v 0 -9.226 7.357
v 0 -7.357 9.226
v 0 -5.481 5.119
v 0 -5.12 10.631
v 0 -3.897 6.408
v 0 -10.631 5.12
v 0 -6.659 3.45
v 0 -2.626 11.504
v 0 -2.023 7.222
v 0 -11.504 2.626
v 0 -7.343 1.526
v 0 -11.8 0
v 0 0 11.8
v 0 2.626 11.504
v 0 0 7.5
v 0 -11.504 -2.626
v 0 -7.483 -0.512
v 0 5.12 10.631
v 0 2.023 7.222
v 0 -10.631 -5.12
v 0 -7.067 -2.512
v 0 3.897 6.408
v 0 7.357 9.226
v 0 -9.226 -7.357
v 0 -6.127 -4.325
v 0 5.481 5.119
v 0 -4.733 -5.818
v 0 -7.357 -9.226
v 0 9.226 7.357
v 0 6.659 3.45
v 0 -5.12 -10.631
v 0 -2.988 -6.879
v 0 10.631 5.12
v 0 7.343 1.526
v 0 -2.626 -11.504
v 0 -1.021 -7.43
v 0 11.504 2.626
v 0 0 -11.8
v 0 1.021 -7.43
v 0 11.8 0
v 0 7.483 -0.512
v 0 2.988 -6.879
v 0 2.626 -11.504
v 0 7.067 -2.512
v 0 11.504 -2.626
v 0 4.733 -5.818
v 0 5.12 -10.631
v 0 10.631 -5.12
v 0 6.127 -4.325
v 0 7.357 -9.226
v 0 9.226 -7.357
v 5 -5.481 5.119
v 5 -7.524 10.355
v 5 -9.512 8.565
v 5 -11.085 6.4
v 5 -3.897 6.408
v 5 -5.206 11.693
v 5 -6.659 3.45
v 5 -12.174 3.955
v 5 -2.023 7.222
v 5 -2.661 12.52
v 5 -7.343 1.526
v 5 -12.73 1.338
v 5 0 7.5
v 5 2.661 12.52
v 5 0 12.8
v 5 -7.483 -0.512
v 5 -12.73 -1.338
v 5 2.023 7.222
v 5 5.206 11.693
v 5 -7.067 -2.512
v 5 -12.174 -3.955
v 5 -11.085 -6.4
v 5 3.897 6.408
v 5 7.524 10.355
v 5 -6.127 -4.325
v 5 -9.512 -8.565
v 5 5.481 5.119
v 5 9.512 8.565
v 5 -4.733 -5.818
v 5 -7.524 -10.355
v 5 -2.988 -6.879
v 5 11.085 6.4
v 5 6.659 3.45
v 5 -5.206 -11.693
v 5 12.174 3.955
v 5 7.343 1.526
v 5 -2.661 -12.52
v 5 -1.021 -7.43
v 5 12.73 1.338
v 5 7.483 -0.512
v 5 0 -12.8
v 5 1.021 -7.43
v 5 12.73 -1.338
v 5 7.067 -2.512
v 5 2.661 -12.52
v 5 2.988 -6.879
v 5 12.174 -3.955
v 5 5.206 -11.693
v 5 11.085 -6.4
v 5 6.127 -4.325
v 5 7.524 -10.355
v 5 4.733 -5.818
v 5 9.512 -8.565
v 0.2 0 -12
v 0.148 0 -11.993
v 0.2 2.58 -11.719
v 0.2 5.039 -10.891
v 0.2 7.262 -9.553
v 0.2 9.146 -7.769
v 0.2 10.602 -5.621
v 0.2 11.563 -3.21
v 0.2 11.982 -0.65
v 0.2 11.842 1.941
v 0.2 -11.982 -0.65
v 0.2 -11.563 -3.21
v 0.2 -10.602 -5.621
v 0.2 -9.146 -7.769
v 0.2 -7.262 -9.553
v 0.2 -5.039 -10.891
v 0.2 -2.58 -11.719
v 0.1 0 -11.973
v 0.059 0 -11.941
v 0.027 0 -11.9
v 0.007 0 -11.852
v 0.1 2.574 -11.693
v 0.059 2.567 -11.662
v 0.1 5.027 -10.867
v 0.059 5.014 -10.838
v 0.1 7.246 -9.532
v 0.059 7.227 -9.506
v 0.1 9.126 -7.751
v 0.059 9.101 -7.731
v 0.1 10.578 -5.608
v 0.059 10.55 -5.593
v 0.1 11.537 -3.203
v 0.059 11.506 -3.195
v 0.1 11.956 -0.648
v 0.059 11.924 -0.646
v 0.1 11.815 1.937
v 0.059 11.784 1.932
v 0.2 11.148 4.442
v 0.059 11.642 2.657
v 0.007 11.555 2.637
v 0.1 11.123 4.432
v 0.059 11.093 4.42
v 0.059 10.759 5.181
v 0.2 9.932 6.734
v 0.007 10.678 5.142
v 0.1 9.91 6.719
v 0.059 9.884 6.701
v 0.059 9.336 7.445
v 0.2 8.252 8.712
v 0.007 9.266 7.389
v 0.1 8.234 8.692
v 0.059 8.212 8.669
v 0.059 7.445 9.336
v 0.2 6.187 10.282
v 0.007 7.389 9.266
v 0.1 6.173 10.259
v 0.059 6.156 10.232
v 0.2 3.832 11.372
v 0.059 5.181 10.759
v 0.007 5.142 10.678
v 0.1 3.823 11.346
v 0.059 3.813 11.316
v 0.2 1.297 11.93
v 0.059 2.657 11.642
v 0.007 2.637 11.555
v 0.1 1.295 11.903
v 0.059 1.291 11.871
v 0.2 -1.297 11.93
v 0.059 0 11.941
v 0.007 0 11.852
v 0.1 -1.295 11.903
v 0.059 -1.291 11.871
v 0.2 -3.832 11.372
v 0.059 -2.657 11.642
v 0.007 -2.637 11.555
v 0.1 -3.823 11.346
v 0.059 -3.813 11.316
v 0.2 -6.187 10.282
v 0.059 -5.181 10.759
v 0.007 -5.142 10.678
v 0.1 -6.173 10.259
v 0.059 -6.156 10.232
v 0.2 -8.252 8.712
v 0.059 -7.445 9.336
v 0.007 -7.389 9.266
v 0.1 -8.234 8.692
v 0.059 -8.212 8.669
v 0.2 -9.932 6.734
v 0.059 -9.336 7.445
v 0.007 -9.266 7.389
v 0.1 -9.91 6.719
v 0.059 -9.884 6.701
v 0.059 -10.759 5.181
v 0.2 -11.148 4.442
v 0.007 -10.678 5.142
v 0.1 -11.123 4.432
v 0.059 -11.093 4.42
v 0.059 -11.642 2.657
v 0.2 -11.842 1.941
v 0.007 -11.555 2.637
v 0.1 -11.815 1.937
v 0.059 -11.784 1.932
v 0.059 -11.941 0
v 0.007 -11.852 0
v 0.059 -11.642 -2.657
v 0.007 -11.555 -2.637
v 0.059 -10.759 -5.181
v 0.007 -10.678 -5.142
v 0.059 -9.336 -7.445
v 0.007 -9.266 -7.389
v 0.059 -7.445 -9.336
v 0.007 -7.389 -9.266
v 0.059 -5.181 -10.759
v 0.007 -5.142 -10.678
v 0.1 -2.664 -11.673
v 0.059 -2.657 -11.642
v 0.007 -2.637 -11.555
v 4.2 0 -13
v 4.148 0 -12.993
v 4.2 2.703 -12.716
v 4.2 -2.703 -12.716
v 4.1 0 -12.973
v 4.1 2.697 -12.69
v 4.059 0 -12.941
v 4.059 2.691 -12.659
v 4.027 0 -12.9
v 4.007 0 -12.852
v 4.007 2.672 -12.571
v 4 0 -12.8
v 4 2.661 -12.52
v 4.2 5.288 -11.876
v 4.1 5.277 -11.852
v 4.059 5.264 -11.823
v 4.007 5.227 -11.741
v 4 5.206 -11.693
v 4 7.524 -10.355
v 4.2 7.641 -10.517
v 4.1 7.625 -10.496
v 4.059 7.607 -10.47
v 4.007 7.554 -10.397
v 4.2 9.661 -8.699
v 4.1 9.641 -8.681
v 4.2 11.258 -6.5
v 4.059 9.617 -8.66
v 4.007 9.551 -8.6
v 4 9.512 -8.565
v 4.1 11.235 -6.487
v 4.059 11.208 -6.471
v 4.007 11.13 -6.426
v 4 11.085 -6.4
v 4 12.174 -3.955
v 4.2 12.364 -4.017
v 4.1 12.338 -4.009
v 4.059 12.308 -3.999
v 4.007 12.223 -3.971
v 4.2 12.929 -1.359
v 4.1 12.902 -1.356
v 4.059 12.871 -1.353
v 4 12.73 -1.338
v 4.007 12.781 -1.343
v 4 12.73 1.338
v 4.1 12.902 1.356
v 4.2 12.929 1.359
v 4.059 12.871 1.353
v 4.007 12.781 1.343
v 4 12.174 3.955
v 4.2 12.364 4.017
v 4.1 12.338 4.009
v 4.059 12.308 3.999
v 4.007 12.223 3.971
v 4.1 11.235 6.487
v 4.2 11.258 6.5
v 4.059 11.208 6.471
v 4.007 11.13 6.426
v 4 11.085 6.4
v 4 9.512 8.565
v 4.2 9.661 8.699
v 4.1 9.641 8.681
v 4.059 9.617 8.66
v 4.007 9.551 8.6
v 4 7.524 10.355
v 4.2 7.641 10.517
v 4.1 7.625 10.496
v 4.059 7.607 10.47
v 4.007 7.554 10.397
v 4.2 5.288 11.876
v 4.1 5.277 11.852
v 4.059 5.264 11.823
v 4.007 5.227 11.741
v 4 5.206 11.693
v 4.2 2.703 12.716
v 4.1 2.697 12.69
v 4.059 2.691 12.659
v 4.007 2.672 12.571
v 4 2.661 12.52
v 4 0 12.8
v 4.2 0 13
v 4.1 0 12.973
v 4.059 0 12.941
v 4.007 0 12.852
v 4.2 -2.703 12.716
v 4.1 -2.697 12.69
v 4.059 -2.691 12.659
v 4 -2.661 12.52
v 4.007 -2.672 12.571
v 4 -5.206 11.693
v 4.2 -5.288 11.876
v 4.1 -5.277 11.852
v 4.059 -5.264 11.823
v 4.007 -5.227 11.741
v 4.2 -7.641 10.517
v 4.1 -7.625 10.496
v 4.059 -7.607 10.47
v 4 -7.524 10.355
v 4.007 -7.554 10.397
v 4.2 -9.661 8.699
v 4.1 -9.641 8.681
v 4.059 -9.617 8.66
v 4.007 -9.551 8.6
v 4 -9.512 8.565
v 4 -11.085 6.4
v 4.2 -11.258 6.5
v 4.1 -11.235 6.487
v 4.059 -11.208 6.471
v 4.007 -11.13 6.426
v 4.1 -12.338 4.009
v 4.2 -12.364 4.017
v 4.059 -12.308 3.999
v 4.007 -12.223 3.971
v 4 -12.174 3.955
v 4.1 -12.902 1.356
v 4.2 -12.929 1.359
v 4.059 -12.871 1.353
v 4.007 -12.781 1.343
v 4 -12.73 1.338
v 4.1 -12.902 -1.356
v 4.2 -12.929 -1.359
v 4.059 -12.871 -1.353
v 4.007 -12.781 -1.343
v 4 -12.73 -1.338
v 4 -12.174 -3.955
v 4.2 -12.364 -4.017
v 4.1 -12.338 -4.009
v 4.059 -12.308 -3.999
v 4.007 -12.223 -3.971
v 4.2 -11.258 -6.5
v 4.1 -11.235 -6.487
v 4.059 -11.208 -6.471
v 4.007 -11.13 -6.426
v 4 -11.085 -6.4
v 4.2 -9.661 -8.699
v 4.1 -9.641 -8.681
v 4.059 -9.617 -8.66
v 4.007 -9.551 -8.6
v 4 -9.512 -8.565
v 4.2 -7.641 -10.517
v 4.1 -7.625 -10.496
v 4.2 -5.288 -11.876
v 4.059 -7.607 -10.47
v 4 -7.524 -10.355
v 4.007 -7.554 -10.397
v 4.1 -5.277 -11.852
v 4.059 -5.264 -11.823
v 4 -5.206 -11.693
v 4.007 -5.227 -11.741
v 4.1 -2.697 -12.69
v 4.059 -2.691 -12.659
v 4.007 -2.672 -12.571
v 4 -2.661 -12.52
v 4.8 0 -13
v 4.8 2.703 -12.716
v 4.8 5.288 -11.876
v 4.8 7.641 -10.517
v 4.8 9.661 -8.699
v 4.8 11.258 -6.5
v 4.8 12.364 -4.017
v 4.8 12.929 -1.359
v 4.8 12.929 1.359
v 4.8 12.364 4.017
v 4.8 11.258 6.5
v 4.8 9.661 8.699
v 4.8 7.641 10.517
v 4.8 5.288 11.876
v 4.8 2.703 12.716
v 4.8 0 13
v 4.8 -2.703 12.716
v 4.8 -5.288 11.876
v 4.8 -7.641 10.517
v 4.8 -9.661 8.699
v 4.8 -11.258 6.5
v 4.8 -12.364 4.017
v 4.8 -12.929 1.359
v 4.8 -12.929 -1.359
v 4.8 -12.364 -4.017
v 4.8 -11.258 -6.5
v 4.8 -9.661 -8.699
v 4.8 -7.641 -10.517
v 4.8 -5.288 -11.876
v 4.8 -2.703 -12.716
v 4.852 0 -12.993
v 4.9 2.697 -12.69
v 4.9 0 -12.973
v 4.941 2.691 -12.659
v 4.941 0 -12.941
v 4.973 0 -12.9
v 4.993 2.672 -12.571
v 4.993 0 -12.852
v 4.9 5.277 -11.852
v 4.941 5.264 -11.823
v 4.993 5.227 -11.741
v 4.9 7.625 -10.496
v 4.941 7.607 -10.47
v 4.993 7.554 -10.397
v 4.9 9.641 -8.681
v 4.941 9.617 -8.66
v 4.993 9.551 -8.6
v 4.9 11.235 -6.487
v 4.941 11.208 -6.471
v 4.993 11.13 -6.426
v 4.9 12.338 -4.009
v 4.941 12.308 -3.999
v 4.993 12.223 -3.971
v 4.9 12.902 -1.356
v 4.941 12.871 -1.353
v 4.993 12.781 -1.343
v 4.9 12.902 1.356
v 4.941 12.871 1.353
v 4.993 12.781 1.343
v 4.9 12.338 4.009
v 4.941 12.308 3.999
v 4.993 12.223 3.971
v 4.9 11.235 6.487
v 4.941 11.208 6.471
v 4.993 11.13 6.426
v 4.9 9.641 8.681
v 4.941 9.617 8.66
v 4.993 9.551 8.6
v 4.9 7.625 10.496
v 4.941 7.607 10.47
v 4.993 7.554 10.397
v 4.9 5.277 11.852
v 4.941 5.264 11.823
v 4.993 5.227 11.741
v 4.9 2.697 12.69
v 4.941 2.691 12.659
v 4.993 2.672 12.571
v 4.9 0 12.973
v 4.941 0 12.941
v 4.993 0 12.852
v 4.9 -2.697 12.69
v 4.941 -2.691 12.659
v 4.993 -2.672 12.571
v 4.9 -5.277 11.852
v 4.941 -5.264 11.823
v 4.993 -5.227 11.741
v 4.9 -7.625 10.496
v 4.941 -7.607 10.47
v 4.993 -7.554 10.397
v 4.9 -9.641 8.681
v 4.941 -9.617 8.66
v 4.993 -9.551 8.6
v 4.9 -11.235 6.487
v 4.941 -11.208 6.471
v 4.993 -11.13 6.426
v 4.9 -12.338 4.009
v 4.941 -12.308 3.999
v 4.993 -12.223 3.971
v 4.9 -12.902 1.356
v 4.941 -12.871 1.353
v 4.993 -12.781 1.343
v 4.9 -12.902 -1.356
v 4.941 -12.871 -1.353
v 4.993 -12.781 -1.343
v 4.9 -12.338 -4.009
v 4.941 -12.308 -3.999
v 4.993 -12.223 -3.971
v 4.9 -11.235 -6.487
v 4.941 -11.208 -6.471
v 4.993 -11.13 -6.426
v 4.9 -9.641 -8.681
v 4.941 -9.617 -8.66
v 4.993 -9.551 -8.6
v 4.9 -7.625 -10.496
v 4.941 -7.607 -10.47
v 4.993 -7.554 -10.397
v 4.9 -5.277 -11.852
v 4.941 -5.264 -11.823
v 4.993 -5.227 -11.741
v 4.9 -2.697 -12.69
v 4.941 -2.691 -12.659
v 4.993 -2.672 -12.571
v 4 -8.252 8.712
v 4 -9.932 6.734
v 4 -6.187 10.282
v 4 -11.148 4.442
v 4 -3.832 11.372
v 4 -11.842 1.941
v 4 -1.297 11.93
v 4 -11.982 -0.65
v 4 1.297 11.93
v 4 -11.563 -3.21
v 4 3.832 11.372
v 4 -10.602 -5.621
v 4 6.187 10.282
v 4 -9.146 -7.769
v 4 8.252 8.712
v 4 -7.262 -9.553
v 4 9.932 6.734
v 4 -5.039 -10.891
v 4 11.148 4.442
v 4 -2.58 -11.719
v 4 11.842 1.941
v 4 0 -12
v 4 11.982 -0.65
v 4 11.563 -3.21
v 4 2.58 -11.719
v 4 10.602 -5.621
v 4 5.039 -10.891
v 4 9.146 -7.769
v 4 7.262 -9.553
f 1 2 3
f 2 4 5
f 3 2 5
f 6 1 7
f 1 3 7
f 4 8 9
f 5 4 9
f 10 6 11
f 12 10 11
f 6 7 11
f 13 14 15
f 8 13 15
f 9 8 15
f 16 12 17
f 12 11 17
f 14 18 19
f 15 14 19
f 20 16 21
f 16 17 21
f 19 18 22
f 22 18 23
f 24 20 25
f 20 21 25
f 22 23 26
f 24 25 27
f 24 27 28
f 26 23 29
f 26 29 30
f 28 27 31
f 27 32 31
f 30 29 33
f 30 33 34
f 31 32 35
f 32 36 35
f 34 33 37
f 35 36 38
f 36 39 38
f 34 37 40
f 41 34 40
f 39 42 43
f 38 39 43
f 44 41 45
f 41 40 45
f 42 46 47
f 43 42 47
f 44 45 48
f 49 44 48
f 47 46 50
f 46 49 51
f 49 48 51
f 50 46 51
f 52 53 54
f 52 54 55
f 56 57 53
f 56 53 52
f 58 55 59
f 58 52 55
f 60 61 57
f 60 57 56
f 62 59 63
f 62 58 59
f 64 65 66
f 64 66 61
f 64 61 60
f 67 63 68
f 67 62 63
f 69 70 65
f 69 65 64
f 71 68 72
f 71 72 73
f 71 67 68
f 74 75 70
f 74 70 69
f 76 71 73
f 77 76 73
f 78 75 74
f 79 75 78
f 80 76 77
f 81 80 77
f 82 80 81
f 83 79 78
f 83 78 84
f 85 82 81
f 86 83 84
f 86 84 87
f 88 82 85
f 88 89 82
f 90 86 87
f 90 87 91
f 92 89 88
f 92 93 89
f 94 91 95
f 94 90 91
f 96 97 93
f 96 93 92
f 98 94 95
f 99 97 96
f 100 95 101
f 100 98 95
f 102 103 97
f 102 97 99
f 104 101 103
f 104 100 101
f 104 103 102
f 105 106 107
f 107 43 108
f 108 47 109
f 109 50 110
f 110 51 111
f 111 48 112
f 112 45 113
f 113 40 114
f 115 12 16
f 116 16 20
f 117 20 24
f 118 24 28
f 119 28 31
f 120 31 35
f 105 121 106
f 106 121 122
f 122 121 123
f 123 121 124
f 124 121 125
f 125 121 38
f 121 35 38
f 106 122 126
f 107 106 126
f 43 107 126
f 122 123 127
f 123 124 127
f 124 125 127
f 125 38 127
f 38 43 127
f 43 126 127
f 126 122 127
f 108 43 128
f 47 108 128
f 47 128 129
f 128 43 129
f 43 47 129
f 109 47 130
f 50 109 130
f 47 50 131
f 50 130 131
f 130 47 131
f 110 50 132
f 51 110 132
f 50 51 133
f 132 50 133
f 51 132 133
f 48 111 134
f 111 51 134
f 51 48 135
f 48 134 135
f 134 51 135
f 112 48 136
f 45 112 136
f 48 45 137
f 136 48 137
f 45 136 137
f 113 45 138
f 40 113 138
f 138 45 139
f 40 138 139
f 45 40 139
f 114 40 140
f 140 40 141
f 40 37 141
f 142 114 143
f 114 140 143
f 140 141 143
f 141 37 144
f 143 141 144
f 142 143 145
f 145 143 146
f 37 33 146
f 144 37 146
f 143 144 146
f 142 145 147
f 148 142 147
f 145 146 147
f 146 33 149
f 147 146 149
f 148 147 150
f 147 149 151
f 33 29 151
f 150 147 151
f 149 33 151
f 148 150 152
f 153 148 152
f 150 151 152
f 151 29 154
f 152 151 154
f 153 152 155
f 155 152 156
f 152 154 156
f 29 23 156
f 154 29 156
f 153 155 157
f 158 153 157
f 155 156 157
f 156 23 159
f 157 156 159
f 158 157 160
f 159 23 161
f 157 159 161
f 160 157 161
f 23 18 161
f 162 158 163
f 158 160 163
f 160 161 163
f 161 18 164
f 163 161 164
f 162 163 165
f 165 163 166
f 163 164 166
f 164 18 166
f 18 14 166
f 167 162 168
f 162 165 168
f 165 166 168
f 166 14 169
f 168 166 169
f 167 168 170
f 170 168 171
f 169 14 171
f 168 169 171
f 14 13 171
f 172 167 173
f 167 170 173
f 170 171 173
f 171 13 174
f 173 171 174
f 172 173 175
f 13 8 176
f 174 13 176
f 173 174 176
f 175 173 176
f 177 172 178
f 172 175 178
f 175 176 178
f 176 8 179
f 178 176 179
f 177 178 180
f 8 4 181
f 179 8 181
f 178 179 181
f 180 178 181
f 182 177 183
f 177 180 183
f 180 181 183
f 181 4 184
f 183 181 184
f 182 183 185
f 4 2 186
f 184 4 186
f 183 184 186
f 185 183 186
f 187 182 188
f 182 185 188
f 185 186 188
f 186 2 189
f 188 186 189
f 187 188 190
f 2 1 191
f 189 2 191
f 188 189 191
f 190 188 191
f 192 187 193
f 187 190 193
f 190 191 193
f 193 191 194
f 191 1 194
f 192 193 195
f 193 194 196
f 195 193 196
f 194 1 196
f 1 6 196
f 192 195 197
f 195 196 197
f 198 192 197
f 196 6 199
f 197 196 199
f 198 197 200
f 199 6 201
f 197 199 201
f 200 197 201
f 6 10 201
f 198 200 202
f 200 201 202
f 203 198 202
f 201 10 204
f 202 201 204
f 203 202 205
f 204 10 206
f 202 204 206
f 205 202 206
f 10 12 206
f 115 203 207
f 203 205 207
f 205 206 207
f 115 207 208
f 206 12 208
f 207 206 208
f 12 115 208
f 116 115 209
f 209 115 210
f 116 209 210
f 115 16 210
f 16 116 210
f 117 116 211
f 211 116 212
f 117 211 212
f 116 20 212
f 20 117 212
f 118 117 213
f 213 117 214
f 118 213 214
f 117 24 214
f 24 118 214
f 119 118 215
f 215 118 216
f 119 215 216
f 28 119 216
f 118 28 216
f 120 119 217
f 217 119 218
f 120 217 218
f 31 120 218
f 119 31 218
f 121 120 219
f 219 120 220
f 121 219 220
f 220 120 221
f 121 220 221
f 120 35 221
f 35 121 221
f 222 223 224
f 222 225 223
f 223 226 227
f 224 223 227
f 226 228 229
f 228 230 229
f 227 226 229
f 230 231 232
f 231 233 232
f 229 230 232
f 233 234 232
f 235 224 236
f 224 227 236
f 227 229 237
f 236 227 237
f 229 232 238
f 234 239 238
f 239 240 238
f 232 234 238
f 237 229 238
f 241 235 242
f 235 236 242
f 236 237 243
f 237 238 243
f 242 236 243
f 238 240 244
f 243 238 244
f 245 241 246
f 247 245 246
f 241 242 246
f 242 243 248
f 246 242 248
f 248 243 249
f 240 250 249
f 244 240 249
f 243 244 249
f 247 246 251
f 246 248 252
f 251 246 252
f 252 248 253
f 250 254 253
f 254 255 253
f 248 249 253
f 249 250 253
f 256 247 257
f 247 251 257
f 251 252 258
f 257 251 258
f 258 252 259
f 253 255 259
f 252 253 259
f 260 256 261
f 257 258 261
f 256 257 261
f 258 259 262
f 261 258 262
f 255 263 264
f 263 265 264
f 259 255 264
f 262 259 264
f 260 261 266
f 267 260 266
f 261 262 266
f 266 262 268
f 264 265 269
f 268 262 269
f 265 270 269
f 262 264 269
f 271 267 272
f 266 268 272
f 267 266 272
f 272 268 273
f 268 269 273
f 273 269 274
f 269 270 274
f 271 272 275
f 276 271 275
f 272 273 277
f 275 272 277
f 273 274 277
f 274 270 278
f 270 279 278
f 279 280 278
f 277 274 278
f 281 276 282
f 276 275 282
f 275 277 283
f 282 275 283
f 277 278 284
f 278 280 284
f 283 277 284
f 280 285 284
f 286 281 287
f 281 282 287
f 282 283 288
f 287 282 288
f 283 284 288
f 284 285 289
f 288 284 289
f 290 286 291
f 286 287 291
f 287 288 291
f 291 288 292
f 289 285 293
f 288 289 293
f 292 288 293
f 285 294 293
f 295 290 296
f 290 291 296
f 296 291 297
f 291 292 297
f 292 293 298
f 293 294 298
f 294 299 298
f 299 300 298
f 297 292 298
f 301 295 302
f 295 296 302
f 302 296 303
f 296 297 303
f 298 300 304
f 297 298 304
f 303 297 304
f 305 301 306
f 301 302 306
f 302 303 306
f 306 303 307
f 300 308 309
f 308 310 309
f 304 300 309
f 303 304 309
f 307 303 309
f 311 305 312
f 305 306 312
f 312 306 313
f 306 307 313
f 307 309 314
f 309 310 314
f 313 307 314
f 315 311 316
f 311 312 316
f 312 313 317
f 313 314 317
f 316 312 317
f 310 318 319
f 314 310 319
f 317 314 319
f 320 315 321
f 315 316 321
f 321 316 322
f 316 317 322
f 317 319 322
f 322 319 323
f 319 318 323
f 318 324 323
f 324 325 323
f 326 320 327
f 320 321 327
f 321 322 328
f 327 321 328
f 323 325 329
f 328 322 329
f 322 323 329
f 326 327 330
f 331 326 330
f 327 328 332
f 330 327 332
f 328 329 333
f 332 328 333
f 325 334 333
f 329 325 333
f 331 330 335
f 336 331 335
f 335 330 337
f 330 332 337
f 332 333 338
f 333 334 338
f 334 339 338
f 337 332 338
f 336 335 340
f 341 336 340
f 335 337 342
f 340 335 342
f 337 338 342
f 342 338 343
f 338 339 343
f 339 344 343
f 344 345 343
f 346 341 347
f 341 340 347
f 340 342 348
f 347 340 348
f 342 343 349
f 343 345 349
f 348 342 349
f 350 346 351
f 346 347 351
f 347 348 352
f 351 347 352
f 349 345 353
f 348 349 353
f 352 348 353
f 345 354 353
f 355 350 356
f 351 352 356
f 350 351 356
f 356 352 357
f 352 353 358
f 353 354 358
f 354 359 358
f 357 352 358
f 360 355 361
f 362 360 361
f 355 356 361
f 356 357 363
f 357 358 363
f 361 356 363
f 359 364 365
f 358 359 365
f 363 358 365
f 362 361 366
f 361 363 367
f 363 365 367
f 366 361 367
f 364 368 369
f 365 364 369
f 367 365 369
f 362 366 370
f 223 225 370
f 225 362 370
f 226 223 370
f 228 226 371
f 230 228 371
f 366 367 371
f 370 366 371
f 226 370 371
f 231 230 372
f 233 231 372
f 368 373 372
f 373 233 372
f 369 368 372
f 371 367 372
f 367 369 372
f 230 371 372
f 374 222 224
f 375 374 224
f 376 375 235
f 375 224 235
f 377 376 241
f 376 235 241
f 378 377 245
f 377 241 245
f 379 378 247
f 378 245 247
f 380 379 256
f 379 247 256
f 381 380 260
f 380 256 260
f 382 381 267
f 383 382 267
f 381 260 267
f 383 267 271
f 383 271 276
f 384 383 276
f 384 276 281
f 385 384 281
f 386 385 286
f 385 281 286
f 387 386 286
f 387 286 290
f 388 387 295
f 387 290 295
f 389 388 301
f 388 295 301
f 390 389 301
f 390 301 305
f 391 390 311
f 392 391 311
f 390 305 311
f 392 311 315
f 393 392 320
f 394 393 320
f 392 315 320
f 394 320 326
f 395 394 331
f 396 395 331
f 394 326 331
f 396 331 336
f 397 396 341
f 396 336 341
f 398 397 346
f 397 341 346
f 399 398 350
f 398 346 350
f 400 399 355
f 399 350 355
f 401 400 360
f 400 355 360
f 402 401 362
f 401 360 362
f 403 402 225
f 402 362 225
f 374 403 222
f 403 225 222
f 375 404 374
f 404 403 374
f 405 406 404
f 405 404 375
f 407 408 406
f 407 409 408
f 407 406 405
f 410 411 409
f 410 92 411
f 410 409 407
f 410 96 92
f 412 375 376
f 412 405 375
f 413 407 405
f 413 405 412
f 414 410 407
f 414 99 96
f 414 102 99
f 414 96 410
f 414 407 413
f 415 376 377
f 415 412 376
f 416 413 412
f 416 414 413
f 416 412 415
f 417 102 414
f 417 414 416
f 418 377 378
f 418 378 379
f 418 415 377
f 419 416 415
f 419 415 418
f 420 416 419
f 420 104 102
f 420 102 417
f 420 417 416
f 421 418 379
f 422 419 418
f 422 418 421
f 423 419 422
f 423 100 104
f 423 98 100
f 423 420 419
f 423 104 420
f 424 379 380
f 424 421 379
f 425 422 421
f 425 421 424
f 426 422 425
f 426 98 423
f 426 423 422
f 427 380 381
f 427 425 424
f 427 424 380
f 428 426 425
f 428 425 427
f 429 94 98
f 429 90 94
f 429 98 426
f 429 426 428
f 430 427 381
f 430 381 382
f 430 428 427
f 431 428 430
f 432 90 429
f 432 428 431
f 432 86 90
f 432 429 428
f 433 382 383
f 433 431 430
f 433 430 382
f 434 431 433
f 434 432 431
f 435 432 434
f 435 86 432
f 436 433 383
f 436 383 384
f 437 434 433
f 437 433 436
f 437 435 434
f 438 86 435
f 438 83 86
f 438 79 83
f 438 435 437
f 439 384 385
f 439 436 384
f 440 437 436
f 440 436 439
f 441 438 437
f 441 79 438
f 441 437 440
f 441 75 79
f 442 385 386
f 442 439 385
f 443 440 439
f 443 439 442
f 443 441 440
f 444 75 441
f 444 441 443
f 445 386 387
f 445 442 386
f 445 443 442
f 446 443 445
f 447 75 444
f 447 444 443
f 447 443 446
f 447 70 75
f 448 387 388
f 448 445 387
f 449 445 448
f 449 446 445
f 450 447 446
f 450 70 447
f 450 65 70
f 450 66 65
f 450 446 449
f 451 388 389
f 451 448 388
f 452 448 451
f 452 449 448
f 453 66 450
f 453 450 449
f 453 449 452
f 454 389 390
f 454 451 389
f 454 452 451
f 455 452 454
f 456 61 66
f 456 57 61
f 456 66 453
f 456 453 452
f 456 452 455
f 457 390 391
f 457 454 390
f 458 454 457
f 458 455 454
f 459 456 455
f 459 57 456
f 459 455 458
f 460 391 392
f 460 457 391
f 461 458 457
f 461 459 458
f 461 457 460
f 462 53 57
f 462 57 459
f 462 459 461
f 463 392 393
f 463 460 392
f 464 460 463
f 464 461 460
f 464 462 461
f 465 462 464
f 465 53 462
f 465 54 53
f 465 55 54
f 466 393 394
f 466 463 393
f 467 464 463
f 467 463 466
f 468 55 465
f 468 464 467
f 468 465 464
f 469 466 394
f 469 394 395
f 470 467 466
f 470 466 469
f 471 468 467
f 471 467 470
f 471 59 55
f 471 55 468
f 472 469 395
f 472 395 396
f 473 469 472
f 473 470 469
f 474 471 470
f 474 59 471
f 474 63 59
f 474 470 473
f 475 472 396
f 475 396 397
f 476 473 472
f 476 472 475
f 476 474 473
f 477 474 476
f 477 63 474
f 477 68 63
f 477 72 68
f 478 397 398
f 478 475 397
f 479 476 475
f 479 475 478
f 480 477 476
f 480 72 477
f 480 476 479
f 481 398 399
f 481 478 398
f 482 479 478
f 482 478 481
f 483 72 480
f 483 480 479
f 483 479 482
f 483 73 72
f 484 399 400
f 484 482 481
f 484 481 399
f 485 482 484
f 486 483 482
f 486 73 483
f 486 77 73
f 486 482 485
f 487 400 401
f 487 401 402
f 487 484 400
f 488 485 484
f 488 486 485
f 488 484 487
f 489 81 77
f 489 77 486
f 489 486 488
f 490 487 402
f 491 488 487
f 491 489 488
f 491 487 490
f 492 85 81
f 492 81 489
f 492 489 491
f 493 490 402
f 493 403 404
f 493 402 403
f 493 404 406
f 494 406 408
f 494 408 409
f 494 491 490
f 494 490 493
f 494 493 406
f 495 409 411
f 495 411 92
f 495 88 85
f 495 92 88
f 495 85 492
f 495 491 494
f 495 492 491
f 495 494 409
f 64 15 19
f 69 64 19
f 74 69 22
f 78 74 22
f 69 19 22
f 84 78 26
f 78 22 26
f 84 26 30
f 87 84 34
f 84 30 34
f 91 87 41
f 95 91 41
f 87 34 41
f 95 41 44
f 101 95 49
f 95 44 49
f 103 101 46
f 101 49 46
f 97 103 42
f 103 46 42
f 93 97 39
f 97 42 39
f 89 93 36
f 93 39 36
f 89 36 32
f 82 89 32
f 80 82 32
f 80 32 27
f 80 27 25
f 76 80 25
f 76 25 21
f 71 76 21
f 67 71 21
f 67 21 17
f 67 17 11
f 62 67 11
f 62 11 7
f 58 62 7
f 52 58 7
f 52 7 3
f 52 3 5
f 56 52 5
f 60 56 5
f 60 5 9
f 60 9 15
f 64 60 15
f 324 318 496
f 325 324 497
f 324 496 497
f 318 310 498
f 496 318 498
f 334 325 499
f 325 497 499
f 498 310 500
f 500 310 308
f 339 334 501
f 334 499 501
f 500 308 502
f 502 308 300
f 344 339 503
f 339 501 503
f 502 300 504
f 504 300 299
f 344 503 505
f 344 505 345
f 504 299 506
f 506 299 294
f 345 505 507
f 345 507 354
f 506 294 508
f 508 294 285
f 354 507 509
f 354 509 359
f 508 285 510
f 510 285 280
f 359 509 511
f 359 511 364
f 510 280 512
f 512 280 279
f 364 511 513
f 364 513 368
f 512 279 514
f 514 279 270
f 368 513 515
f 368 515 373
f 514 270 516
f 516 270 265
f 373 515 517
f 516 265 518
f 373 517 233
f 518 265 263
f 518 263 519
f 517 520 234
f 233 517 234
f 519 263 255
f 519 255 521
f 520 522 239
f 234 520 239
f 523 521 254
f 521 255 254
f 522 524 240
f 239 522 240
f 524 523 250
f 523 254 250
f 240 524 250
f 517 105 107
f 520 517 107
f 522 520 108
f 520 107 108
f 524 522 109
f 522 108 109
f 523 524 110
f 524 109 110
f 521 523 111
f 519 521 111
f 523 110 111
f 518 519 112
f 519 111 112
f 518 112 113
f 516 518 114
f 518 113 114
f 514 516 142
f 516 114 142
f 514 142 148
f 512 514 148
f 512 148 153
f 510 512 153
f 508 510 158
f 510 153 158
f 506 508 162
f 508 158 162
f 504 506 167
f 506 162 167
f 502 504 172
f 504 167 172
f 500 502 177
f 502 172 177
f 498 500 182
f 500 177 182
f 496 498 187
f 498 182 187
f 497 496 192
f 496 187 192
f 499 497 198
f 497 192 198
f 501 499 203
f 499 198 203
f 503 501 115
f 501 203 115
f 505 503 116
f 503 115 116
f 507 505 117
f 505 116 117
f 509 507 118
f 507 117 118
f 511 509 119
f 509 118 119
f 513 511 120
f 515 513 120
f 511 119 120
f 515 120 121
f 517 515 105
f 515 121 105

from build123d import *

# Parameters (mm, degrees)
SKETCH_1_R          = 12
EXTRUDE_1_DEPTH     = 4
SKETCH_2_R          = 13
EXTRUDE_2_DEPTH     = 1
SKETCH_3_R          = 7.5
CUT_EXTRUDE_1_DEPTH = 6
FILLET_1_R          = 0.2


with BuildPart() as part:
    # 草图1 → 凸台-拉伸1 (new body)
    with BuildSketch(Plane(origin=(0, 0, 0), x_dir=(0, 0, -1), z_dir=(1, 0, 0))):
        Circle(SKETCH_1_R)
    extrude(amount=EXTRUDE_1_DEPTH)

    # 草图2 → 凸台-拉伸2 (add)
    with BuildSketch(Plane(origin=(4, 0, 0), x_dir=(0, 0, -1), z_dir=(1, 0, 0))):
        Circle(SKETCH_2_R)
    extrude(amount=EXTRUDE_2_DEPTH)

    # 草图3 → 切除-拉伸1 (cut, through all)
    with BuildSketch(Plane.ZY):
        Circle(SKETCH_3_R)
    extrude(amount=-CUT_EXTRUDE_1_DEPTH, mode=Mode.SUBTRACT)

    # 圆角1
    fillet_1_edges = [part.edges().sort_by_distance(p)[0] for p in [
        (0, 0, 12),
        (4, 0, 13),
        (5, 0, 13),
    ]]
    fillet(fillet_1_edges, radius=FILLET_1_R)


solid = part.part
